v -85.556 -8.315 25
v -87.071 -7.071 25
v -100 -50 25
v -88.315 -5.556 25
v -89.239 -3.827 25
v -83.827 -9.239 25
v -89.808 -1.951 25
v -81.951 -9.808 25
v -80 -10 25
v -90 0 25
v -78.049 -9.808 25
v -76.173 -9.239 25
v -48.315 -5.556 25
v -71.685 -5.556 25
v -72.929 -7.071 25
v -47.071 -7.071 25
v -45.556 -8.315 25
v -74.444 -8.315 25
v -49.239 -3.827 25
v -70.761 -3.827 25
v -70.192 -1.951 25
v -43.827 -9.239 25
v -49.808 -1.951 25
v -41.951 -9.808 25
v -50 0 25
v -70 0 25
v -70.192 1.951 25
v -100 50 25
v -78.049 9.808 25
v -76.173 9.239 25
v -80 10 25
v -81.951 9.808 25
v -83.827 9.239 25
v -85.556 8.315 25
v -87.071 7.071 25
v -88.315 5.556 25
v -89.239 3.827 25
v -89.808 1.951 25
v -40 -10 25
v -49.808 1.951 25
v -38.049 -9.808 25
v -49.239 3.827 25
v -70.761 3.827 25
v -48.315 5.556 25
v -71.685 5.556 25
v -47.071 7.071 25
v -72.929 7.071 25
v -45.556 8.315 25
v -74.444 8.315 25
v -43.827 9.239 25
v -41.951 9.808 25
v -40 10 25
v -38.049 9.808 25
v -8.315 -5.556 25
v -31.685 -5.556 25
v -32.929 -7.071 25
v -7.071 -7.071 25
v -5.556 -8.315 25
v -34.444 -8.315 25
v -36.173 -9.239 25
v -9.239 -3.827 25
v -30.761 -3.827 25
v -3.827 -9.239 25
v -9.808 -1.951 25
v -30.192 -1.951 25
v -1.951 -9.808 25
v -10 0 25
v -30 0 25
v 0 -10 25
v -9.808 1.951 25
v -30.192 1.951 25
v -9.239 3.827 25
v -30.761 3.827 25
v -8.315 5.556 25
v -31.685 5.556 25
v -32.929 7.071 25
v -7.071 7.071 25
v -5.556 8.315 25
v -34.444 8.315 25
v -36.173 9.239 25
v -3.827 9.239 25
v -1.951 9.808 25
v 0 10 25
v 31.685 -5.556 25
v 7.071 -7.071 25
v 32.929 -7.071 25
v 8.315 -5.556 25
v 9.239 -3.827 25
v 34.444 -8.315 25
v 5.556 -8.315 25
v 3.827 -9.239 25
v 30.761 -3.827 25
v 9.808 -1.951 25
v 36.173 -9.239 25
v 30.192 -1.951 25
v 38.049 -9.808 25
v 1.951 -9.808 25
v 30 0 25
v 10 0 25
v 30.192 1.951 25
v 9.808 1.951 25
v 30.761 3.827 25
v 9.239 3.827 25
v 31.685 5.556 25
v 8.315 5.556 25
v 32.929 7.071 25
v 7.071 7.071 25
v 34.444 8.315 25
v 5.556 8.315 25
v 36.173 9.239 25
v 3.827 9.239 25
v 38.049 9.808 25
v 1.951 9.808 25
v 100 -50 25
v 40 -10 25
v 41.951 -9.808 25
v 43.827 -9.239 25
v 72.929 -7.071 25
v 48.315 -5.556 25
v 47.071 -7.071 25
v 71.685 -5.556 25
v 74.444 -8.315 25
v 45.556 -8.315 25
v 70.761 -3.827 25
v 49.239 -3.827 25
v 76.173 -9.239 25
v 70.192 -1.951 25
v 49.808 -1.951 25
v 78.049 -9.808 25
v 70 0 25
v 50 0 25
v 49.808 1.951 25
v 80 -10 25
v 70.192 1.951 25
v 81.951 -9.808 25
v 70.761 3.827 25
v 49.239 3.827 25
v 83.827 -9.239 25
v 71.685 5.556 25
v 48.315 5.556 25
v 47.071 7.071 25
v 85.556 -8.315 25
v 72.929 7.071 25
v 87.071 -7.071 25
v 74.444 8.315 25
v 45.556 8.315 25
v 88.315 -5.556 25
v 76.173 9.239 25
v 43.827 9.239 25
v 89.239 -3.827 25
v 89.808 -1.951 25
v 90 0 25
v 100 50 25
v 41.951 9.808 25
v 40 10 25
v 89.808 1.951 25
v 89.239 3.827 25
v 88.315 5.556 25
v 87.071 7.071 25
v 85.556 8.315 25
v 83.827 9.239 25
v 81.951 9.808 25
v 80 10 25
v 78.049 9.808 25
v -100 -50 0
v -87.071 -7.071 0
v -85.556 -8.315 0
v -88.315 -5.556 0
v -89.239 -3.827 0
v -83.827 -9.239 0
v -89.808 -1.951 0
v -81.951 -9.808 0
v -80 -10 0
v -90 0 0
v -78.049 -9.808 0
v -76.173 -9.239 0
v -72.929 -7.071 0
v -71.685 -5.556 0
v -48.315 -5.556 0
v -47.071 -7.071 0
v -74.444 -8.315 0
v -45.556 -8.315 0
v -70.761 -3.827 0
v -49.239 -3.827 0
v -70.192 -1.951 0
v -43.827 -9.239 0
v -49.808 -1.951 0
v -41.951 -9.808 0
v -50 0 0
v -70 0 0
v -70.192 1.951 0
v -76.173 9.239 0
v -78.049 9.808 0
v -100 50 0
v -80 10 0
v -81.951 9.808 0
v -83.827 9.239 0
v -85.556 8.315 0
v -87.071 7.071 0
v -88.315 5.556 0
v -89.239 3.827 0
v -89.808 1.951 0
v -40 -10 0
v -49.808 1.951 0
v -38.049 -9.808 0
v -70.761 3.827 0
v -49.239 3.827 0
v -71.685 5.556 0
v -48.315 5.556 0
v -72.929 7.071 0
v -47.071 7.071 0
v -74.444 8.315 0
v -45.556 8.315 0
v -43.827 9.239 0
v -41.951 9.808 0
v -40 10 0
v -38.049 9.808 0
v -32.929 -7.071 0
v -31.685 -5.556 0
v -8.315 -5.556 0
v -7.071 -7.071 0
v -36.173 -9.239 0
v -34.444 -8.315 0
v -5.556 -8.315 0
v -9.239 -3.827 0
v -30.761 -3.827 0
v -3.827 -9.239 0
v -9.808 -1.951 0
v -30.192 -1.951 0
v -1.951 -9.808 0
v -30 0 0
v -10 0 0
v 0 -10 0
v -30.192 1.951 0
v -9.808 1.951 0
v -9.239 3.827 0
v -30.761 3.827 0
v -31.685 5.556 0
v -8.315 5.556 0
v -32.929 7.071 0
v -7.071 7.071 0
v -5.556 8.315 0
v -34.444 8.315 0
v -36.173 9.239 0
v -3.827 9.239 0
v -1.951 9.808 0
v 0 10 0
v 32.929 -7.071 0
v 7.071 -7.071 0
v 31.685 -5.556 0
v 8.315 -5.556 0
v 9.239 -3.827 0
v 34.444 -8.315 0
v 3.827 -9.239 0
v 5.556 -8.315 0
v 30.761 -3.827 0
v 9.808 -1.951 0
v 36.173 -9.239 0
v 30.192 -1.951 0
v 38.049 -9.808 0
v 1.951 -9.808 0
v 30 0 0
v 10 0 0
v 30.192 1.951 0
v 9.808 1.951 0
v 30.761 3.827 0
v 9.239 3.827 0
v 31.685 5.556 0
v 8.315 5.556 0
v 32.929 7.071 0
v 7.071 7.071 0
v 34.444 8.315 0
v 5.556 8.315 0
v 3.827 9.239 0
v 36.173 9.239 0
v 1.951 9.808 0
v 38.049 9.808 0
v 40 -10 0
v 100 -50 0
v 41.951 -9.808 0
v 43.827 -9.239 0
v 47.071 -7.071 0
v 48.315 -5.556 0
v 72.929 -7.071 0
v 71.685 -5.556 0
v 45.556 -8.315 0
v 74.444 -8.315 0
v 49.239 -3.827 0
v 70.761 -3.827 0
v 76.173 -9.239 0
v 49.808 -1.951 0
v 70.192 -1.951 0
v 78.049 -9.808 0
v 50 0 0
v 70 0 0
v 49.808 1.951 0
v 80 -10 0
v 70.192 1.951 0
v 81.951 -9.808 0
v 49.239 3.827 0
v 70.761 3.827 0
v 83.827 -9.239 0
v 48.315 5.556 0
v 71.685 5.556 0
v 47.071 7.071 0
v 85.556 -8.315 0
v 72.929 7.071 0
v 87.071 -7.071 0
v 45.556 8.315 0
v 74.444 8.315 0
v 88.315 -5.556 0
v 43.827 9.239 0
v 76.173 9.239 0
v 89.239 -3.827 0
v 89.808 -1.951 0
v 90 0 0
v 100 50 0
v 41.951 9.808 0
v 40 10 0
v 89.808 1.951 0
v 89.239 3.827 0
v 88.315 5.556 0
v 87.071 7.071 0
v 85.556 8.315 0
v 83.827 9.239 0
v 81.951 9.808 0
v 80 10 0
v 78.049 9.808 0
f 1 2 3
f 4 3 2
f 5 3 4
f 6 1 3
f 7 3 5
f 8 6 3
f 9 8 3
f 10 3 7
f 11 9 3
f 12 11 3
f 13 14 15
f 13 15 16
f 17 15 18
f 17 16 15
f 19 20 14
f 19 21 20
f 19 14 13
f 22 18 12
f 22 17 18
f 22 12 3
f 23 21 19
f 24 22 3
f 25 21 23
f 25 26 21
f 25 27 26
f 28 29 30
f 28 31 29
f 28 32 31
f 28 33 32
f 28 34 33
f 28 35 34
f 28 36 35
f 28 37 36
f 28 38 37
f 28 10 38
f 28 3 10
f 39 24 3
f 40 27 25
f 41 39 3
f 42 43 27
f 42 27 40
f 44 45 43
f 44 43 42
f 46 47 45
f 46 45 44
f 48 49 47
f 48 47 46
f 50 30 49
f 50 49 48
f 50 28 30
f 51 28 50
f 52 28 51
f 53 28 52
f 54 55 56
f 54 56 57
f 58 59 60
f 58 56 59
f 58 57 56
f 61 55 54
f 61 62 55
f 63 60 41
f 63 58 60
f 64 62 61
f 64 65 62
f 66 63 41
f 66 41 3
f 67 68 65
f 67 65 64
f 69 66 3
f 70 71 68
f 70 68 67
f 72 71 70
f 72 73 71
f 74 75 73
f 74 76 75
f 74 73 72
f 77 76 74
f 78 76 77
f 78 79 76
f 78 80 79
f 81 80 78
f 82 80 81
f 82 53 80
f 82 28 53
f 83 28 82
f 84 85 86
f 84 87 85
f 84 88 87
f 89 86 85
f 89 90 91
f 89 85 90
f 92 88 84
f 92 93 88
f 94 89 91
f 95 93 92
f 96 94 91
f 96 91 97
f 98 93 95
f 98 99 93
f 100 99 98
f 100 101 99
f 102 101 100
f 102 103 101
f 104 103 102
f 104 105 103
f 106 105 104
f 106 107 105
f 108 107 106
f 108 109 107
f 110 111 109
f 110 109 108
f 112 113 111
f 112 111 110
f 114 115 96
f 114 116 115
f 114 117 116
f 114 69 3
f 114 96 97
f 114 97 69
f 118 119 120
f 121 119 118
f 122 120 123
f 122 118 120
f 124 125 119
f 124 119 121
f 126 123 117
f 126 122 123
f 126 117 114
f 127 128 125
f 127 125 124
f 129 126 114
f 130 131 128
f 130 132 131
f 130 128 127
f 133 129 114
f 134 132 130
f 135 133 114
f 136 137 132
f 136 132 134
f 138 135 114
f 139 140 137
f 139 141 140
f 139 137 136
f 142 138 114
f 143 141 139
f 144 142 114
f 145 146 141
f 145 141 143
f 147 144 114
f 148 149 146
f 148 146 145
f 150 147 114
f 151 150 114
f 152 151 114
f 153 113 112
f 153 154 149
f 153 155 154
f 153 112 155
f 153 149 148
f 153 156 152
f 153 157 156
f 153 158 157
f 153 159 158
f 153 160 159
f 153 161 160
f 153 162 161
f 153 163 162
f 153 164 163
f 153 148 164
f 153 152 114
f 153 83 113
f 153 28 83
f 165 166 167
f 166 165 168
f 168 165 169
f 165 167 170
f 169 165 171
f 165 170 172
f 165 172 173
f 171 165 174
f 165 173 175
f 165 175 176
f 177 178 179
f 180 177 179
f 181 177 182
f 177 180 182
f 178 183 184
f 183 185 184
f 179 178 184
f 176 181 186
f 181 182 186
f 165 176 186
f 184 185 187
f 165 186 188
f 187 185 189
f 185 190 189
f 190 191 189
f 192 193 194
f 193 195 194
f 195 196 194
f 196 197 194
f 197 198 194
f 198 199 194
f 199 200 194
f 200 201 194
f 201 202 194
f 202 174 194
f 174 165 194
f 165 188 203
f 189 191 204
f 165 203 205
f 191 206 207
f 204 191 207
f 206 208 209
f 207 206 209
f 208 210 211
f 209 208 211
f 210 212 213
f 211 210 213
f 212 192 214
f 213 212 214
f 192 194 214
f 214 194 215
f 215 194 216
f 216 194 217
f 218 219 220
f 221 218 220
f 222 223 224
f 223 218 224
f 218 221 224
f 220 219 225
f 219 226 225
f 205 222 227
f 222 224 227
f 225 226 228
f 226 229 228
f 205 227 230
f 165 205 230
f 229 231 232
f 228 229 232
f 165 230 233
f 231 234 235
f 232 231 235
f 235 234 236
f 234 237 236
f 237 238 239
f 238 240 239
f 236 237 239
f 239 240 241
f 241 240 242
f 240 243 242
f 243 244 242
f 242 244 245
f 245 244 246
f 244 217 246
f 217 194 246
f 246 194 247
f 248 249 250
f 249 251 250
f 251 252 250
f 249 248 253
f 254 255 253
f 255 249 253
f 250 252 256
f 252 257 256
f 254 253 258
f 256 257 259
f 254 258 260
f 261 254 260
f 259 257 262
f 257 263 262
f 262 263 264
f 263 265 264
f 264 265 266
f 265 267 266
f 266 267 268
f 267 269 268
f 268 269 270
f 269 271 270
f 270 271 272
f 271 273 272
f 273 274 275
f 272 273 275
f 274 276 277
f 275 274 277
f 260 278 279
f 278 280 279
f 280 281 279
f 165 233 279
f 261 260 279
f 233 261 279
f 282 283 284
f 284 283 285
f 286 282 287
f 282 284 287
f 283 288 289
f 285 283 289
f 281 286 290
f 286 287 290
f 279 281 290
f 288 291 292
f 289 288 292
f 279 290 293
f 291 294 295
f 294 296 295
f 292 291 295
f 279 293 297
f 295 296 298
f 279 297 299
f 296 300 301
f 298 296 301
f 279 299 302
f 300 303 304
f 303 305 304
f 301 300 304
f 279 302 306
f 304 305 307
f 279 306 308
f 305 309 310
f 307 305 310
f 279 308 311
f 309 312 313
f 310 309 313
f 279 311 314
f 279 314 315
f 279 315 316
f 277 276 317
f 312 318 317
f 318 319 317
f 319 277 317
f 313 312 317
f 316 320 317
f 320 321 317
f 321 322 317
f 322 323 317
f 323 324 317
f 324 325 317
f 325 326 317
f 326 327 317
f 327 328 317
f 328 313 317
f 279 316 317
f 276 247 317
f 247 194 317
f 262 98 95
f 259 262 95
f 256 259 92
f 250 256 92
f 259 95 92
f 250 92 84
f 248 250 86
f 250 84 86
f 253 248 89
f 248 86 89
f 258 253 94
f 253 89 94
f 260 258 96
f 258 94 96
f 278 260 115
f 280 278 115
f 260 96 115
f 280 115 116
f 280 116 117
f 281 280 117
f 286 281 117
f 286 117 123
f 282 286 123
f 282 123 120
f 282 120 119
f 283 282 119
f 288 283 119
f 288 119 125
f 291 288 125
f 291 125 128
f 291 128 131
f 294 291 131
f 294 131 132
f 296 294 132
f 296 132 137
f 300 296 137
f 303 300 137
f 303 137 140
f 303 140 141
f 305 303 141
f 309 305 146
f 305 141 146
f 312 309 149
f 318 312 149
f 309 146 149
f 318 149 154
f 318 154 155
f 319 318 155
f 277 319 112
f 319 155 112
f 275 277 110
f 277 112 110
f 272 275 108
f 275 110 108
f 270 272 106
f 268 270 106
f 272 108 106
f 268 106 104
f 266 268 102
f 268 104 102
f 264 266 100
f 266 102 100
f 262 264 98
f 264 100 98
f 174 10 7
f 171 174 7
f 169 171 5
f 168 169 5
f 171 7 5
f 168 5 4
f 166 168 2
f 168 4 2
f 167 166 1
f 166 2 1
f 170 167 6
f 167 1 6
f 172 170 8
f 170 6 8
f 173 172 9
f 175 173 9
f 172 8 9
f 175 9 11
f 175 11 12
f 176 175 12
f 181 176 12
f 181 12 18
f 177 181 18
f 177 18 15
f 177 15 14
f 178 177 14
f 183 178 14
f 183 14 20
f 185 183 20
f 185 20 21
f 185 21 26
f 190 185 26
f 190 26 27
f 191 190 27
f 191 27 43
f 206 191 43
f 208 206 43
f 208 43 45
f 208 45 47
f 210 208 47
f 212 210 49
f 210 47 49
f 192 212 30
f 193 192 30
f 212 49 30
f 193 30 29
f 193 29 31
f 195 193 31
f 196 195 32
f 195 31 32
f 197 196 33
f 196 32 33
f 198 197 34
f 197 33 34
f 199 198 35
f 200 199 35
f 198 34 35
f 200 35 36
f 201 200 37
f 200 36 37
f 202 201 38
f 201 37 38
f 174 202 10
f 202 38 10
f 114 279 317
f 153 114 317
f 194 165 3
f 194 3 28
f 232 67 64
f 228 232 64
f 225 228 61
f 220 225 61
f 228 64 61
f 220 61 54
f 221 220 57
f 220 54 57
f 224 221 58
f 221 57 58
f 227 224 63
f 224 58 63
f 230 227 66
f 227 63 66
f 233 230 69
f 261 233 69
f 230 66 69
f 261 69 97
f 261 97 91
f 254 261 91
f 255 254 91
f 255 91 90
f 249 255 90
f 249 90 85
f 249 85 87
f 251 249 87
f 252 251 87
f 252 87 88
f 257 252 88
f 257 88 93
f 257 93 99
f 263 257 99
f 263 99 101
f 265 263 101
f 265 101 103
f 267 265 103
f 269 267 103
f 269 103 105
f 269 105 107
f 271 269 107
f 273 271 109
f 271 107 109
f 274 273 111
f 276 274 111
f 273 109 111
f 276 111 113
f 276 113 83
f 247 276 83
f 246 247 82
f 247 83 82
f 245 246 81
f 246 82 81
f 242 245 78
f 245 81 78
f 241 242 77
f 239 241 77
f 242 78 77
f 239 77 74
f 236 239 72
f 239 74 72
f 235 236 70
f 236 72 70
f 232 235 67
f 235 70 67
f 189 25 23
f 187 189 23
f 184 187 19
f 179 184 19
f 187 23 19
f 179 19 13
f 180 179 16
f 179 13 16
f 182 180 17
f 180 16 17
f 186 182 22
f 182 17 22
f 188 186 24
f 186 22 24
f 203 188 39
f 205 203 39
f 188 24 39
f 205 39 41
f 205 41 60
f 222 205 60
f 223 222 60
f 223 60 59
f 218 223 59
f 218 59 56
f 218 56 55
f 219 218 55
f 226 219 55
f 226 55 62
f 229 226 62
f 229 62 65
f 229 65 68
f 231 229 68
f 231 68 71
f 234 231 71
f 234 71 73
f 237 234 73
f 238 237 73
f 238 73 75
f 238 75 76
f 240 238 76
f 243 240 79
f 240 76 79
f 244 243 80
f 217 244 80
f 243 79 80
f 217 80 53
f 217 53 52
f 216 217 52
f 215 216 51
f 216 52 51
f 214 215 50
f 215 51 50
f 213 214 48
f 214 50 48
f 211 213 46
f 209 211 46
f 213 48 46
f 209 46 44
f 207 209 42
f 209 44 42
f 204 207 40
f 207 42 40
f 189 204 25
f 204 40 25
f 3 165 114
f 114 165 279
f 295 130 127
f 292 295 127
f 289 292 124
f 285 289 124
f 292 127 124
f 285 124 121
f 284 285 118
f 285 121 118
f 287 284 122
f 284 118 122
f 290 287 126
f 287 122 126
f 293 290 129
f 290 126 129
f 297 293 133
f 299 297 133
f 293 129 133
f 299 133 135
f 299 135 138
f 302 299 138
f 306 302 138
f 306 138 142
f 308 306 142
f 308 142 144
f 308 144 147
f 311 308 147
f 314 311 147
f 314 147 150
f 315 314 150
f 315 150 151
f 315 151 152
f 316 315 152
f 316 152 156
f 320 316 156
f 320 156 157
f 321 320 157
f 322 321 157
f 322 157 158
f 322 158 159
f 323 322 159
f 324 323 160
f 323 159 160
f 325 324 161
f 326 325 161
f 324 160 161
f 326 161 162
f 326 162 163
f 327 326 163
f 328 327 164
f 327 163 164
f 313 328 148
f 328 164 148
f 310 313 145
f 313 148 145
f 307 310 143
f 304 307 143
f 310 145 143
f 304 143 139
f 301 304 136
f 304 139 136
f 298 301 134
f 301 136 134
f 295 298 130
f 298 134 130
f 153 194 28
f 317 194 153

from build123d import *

# Parameters (mm, degrees)
F0_W     = 200
F0_H     = 100
F1_DEPTH = 25
F2_D     = 20
F2_DEPTH = 25


with BuildPart() as f1:
    # F0 (on Top) → F1 (new body)
    with BuildSketch(Plane.XY):
        Rectangle(F0_W, F0_H)
    extrude(amount=F1_DEPTH)

    # F2
    with Locations(Plane(origin=(0, 0, 0), x_dir=(1, 0, 0), z_dir=(0, 0, -1))):
        with Locations((-80, 0), (-40, 0), (0, 0), (40, 0), (80, 0)):
            Hole(F2_D / 2, depth=F2_DEPTH)


solid = f1.part
